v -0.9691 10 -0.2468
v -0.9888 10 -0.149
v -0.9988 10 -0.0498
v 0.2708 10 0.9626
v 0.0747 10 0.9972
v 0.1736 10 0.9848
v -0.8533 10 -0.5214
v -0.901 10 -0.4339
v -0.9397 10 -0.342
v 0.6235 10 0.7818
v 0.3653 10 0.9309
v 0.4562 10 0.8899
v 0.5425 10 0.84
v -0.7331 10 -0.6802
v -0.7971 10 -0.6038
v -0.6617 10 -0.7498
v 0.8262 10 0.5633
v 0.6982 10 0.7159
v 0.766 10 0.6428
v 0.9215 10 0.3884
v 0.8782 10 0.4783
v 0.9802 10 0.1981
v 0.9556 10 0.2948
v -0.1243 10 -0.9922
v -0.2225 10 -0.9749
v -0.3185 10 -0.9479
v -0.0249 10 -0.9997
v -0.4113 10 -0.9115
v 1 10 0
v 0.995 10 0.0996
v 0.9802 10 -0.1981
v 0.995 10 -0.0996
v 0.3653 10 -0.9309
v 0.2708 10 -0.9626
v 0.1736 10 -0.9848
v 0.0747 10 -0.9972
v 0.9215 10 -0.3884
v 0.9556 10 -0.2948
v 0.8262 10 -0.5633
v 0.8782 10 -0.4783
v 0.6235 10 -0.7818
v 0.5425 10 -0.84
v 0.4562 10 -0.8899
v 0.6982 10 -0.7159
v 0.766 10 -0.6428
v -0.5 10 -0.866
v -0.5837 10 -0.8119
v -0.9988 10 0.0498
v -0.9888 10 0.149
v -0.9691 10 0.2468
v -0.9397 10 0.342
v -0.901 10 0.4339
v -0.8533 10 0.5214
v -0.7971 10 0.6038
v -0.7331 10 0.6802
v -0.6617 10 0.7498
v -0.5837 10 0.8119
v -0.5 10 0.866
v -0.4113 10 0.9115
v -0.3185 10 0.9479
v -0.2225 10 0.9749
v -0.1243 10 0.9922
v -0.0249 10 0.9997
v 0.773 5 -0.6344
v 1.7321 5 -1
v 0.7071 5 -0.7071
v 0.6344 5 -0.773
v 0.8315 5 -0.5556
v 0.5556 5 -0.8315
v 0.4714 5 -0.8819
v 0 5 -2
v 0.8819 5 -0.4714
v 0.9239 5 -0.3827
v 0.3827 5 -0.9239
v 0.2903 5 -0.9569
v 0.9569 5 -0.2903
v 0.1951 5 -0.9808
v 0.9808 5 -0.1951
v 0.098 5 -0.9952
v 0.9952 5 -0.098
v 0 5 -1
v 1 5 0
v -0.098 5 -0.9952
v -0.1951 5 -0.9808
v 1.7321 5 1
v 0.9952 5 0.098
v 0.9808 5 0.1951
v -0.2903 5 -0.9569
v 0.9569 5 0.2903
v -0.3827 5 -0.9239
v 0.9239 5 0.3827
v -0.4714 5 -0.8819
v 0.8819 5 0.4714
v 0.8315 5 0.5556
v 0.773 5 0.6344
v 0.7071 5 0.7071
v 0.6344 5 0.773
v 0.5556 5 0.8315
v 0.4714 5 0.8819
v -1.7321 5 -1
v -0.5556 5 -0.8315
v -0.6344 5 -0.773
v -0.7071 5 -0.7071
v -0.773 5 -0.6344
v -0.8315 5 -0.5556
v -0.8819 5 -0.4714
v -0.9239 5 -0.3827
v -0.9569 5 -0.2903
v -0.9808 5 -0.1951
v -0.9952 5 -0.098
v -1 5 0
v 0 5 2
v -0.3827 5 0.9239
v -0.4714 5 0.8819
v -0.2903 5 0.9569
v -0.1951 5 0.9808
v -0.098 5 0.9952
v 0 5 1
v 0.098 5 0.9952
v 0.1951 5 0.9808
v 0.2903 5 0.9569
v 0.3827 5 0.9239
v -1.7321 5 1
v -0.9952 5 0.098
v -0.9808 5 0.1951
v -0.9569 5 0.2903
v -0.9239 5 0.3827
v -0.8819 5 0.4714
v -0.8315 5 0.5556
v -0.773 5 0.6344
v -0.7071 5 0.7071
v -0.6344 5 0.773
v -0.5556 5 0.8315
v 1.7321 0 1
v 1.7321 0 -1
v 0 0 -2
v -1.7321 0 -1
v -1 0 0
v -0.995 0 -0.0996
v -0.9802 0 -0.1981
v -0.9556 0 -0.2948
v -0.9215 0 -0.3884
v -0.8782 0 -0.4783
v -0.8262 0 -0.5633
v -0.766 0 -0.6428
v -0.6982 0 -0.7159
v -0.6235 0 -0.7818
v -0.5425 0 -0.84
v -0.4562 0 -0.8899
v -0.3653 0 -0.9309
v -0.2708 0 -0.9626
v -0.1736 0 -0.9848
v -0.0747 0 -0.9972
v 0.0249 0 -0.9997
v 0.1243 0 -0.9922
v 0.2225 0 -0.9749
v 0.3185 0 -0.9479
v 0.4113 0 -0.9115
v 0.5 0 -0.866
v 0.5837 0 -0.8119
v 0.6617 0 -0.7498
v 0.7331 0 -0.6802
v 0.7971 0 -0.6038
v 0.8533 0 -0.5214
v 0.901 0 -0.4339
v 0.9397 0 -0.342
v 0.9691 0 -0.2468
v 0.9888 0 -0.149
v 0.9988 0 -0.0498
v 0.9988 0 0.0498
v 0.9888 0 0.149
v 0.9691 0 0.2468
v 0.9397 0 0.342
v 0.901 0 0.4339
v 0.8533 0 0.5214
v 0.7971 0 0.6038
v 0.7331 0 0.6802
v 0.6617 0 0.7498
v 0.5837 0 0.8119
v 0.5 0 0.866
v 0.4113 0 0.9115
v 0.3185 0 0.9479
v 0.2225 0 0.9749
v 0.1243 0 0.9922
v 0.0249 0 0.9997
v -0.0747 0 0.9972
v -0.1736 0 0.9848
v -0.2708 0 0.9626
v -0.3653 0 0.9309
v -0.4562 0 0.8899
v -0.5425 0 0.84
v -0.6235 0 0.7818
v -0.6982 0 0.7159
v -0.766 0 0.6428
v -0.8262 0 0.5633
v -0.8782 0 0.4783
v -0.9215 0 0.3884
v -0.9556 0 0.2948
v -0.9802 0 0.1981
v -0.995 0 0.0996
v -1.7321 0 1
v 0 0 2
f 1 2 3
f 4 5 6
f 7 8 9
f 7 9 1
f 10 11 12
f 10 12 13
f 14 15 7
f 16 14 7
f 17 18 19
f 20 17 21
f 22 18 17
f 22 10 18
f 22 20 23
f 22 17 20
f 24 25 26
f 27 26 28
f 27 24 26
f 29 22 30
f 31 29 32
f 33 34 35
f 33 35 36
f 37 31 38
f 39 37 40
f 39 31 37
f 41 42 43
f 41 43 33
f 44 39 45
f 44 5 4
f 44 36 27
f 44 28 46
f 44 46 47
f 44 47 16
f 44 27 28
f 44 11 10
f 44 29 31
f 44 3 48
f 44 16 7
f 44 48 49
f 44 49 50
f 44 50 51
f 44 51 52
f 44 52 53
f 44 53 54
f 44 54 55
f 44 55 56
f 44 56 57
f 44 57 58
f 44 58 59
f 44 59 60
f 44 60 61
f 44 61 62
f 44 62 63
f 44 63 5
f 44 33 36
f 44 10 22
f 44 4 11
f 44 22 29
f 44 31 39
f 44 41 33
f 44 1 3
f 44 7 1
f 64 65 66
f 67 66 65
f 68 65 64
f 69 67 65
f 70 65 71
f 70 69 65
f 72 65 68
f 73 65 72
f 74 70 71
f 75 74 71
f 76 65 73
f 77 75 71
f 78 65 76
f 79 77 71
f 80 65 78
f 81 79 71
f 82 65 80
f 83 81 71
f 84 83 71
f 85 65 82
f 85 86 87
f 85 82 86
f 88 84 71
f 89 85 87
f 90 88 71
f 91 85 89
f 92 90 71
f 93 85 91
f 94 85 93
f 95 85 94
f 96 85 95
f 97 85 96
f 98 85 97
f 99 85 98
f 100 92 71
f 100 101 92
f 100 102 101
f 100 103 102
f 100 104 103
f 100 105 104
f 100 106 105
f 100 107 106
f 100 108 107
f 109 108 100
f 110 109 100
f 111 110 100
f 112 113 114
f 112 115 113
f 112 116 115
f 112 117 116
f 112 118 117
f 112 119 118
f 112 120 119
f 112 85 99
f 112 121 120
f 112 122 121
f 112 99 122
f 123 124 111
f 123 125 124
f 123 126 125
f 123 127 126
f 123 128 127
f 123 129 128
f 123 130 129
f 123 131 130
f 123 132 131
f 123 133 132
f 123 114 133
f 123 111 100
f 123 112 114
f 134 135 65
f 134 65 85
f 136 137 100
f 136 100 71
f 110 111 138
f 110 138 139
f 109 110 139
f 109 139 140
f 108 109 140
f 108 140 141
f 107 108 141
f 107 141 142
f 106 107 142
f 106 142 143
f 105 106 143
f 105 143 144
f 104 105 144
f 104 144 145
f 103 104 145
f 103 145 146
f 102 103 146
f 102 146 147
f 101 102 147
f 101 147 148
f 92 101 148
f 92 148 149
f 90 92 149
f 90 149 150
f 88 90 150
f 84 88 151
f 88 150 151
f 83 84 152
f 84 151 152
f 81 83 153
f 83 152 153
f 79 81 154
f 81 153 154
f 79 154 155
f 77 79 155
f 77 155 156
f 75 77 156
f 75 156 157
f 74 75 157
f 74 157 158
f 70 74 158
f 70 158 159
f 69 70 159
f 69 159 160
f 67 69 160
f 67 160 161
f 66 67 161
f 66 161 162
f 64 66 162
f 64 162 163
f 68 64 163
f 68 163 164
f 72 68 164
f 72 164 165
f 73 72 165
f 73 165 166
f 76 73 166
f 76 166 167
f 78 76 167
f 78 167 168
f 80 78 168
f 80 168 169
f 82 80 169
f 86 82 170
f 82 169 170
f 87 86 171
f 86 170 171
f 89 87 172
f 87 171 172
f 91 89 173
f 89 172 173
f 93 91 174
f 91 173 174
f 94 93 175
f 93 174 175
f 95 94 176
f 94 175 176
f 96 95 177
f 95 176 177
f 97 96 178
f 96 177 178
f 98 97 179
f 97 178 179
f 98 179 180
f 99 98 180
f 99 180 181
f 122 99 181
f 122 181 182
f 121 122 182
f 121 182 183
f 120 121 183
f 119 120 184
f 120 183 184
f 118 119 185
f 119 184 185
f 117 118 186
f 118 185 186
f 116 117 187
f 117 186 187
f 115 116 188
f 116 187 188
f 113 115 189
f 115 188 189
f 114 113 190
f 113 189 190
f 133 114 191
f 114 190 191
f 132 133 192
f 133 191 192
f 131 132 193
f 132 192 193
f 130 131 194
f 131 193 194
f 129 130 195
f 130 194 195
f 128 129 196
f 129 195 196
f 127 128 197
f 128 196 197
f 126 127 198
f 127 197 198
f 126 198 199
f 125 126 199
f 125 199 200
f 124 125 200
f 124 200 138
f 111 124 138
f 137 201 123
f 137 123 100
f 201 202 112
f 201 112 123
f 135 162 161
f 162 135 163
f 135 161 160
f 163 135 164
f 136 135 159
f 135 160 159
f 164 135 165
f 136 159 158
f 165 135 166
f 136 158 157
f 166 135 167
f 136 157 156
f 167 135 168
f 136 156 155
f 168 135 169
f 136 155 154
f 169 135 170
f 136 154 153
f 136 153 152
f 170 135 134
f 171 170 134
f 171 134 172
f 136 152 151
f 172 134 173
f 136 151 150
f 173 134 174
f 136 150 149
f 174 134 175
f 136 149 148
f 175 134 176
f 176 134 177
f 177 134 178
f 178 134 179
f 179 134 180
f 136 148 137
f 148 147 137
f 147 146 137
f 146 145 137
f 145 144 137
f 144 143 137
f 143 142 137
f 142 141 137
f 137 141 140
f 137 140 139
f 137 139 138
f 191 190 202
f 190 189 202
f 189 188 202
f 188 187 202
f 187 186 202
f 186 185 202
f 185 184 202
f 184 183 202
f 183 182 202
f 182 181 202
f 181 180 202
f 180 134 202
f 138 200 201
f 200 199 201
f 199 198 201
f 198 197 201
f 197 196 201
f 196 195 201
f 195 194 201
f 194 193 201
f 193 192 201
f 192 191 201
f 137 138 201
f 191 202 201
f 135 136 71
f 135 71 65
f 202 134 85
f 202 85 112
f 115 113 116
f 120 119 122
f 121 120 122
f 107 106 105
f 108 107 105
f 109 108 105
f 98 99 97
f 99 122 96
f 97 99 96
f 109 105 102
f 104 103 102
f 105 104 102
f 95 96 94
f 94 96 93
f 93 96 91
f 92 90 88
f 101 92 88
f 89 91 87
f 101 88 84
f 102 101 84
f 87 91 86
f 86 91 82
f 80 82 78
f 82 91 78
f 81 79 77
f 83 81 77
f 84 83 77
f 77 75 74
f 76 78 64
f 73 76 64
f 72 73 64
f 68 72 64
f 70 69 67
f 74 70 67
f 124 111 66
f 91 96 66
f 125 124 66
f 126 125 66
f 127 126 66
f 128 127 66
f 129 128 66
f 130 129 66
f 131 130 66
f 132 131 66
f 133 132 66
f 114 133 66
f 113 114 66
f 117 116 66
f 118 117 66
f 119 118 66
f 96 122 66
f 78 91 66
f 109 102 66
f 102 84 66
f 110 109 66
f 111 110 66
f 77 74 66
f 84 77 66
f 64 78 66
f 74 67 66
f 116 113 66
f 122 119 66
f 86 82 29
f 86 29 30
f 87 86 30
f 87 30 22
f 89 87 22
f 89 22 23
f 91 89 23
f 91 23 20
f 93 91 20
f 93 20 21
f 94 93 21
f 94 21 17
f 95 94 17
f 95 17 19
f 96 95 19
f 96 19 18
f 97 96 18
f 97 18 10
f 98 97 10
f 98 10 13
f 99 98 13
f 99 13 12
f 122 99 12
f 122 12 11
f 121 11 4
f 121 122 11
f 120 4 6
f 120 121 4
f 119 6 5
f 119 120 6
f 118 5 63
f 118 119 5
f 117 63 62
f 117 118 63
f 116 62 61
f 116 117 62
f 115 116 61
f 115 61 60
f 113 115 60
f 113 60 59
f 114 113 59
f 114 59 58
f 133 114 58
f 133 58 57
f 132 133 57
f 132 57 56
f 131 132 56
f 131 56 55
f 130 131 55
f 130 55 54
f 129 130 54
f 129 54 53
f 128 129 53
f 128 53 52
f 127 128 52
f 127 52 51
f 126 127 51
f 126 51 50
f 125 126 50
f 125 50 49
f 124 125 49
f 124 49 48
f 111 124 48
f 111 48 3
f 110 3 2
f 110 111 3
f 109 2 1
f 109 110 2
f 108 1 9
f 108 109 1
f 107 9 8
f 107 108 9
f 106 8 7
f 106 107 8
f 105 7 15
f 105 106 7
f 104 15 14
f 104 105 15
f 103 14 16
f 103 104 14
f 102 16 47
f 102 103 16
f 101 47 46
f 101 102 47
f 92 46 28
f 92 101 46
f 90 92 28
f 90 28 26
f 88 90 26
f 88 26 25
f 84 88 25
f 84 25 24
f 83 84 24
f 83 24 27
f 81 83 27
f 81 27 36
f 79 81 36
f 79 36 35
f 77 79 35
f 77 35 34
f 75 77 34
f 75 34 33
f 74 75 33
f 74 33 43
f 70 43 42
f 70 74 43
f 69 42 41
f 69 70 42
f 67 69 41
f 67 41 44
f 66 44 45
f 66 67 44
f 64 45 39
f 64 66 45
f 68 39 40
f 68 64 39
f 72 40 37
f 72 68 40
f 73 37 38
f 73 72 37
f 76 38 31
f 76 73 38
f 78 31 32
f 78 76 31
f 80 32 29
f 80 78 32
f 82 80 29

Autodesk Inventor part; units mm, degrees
ref_plane "YZ Plane" through (0, 0, 0) normal (1, 0, 0) x (0, 1, 0)
ref_plane "XZ Plane" through (0, 0, 0) normal (0, 1, 0) x (-1, 0, 0)
ref_plane "XY Plane" through (0, 0, 0) normal (0, 0, 1) x (1, 0, 0)
sketch "Sketch1" plane through (0, 0, 0) normal (0, 1, 0) x (-1, 0, 0)
  circle A0 centre (0, 0) radius 1
  line L0 (0, -2) -> (-1.7321, -1)
  line L1 (-1.7321, -1) -> (-1.7321, 1)
  line L2 (-1.7321, 1) -> (0, 2)
  line L3 (0, 2) -> (1.7321, 1)
  line L4 (1.7321, 1) -> (1.7321, -1)
  line L5 (1.7321, -1) -> (0, -2)
  dimension "d0" = 2
  dimension "d1" = 2
extrude "Extrusion1" add sketch "Sketch1" along normal blind 5
sketch "Sketch2" plane through (0, 5, 0) normal (0, 1, 0) x (1, 0, 0)
  circle A0 centre (0, 0) radius 1
extrude "Extrusion2" add sketch "Sketch2" along normal blind 5
thread "Thread1" size "M2x0.4" class "6g" standard "ANSI Metric M Profile" full length
thread "Thread2" size "M2x0.4" class "6H" standard "ANSI Metric M Profile" full length
properties part number "dist5mmM2" material "Brass, Soft Yellow"
